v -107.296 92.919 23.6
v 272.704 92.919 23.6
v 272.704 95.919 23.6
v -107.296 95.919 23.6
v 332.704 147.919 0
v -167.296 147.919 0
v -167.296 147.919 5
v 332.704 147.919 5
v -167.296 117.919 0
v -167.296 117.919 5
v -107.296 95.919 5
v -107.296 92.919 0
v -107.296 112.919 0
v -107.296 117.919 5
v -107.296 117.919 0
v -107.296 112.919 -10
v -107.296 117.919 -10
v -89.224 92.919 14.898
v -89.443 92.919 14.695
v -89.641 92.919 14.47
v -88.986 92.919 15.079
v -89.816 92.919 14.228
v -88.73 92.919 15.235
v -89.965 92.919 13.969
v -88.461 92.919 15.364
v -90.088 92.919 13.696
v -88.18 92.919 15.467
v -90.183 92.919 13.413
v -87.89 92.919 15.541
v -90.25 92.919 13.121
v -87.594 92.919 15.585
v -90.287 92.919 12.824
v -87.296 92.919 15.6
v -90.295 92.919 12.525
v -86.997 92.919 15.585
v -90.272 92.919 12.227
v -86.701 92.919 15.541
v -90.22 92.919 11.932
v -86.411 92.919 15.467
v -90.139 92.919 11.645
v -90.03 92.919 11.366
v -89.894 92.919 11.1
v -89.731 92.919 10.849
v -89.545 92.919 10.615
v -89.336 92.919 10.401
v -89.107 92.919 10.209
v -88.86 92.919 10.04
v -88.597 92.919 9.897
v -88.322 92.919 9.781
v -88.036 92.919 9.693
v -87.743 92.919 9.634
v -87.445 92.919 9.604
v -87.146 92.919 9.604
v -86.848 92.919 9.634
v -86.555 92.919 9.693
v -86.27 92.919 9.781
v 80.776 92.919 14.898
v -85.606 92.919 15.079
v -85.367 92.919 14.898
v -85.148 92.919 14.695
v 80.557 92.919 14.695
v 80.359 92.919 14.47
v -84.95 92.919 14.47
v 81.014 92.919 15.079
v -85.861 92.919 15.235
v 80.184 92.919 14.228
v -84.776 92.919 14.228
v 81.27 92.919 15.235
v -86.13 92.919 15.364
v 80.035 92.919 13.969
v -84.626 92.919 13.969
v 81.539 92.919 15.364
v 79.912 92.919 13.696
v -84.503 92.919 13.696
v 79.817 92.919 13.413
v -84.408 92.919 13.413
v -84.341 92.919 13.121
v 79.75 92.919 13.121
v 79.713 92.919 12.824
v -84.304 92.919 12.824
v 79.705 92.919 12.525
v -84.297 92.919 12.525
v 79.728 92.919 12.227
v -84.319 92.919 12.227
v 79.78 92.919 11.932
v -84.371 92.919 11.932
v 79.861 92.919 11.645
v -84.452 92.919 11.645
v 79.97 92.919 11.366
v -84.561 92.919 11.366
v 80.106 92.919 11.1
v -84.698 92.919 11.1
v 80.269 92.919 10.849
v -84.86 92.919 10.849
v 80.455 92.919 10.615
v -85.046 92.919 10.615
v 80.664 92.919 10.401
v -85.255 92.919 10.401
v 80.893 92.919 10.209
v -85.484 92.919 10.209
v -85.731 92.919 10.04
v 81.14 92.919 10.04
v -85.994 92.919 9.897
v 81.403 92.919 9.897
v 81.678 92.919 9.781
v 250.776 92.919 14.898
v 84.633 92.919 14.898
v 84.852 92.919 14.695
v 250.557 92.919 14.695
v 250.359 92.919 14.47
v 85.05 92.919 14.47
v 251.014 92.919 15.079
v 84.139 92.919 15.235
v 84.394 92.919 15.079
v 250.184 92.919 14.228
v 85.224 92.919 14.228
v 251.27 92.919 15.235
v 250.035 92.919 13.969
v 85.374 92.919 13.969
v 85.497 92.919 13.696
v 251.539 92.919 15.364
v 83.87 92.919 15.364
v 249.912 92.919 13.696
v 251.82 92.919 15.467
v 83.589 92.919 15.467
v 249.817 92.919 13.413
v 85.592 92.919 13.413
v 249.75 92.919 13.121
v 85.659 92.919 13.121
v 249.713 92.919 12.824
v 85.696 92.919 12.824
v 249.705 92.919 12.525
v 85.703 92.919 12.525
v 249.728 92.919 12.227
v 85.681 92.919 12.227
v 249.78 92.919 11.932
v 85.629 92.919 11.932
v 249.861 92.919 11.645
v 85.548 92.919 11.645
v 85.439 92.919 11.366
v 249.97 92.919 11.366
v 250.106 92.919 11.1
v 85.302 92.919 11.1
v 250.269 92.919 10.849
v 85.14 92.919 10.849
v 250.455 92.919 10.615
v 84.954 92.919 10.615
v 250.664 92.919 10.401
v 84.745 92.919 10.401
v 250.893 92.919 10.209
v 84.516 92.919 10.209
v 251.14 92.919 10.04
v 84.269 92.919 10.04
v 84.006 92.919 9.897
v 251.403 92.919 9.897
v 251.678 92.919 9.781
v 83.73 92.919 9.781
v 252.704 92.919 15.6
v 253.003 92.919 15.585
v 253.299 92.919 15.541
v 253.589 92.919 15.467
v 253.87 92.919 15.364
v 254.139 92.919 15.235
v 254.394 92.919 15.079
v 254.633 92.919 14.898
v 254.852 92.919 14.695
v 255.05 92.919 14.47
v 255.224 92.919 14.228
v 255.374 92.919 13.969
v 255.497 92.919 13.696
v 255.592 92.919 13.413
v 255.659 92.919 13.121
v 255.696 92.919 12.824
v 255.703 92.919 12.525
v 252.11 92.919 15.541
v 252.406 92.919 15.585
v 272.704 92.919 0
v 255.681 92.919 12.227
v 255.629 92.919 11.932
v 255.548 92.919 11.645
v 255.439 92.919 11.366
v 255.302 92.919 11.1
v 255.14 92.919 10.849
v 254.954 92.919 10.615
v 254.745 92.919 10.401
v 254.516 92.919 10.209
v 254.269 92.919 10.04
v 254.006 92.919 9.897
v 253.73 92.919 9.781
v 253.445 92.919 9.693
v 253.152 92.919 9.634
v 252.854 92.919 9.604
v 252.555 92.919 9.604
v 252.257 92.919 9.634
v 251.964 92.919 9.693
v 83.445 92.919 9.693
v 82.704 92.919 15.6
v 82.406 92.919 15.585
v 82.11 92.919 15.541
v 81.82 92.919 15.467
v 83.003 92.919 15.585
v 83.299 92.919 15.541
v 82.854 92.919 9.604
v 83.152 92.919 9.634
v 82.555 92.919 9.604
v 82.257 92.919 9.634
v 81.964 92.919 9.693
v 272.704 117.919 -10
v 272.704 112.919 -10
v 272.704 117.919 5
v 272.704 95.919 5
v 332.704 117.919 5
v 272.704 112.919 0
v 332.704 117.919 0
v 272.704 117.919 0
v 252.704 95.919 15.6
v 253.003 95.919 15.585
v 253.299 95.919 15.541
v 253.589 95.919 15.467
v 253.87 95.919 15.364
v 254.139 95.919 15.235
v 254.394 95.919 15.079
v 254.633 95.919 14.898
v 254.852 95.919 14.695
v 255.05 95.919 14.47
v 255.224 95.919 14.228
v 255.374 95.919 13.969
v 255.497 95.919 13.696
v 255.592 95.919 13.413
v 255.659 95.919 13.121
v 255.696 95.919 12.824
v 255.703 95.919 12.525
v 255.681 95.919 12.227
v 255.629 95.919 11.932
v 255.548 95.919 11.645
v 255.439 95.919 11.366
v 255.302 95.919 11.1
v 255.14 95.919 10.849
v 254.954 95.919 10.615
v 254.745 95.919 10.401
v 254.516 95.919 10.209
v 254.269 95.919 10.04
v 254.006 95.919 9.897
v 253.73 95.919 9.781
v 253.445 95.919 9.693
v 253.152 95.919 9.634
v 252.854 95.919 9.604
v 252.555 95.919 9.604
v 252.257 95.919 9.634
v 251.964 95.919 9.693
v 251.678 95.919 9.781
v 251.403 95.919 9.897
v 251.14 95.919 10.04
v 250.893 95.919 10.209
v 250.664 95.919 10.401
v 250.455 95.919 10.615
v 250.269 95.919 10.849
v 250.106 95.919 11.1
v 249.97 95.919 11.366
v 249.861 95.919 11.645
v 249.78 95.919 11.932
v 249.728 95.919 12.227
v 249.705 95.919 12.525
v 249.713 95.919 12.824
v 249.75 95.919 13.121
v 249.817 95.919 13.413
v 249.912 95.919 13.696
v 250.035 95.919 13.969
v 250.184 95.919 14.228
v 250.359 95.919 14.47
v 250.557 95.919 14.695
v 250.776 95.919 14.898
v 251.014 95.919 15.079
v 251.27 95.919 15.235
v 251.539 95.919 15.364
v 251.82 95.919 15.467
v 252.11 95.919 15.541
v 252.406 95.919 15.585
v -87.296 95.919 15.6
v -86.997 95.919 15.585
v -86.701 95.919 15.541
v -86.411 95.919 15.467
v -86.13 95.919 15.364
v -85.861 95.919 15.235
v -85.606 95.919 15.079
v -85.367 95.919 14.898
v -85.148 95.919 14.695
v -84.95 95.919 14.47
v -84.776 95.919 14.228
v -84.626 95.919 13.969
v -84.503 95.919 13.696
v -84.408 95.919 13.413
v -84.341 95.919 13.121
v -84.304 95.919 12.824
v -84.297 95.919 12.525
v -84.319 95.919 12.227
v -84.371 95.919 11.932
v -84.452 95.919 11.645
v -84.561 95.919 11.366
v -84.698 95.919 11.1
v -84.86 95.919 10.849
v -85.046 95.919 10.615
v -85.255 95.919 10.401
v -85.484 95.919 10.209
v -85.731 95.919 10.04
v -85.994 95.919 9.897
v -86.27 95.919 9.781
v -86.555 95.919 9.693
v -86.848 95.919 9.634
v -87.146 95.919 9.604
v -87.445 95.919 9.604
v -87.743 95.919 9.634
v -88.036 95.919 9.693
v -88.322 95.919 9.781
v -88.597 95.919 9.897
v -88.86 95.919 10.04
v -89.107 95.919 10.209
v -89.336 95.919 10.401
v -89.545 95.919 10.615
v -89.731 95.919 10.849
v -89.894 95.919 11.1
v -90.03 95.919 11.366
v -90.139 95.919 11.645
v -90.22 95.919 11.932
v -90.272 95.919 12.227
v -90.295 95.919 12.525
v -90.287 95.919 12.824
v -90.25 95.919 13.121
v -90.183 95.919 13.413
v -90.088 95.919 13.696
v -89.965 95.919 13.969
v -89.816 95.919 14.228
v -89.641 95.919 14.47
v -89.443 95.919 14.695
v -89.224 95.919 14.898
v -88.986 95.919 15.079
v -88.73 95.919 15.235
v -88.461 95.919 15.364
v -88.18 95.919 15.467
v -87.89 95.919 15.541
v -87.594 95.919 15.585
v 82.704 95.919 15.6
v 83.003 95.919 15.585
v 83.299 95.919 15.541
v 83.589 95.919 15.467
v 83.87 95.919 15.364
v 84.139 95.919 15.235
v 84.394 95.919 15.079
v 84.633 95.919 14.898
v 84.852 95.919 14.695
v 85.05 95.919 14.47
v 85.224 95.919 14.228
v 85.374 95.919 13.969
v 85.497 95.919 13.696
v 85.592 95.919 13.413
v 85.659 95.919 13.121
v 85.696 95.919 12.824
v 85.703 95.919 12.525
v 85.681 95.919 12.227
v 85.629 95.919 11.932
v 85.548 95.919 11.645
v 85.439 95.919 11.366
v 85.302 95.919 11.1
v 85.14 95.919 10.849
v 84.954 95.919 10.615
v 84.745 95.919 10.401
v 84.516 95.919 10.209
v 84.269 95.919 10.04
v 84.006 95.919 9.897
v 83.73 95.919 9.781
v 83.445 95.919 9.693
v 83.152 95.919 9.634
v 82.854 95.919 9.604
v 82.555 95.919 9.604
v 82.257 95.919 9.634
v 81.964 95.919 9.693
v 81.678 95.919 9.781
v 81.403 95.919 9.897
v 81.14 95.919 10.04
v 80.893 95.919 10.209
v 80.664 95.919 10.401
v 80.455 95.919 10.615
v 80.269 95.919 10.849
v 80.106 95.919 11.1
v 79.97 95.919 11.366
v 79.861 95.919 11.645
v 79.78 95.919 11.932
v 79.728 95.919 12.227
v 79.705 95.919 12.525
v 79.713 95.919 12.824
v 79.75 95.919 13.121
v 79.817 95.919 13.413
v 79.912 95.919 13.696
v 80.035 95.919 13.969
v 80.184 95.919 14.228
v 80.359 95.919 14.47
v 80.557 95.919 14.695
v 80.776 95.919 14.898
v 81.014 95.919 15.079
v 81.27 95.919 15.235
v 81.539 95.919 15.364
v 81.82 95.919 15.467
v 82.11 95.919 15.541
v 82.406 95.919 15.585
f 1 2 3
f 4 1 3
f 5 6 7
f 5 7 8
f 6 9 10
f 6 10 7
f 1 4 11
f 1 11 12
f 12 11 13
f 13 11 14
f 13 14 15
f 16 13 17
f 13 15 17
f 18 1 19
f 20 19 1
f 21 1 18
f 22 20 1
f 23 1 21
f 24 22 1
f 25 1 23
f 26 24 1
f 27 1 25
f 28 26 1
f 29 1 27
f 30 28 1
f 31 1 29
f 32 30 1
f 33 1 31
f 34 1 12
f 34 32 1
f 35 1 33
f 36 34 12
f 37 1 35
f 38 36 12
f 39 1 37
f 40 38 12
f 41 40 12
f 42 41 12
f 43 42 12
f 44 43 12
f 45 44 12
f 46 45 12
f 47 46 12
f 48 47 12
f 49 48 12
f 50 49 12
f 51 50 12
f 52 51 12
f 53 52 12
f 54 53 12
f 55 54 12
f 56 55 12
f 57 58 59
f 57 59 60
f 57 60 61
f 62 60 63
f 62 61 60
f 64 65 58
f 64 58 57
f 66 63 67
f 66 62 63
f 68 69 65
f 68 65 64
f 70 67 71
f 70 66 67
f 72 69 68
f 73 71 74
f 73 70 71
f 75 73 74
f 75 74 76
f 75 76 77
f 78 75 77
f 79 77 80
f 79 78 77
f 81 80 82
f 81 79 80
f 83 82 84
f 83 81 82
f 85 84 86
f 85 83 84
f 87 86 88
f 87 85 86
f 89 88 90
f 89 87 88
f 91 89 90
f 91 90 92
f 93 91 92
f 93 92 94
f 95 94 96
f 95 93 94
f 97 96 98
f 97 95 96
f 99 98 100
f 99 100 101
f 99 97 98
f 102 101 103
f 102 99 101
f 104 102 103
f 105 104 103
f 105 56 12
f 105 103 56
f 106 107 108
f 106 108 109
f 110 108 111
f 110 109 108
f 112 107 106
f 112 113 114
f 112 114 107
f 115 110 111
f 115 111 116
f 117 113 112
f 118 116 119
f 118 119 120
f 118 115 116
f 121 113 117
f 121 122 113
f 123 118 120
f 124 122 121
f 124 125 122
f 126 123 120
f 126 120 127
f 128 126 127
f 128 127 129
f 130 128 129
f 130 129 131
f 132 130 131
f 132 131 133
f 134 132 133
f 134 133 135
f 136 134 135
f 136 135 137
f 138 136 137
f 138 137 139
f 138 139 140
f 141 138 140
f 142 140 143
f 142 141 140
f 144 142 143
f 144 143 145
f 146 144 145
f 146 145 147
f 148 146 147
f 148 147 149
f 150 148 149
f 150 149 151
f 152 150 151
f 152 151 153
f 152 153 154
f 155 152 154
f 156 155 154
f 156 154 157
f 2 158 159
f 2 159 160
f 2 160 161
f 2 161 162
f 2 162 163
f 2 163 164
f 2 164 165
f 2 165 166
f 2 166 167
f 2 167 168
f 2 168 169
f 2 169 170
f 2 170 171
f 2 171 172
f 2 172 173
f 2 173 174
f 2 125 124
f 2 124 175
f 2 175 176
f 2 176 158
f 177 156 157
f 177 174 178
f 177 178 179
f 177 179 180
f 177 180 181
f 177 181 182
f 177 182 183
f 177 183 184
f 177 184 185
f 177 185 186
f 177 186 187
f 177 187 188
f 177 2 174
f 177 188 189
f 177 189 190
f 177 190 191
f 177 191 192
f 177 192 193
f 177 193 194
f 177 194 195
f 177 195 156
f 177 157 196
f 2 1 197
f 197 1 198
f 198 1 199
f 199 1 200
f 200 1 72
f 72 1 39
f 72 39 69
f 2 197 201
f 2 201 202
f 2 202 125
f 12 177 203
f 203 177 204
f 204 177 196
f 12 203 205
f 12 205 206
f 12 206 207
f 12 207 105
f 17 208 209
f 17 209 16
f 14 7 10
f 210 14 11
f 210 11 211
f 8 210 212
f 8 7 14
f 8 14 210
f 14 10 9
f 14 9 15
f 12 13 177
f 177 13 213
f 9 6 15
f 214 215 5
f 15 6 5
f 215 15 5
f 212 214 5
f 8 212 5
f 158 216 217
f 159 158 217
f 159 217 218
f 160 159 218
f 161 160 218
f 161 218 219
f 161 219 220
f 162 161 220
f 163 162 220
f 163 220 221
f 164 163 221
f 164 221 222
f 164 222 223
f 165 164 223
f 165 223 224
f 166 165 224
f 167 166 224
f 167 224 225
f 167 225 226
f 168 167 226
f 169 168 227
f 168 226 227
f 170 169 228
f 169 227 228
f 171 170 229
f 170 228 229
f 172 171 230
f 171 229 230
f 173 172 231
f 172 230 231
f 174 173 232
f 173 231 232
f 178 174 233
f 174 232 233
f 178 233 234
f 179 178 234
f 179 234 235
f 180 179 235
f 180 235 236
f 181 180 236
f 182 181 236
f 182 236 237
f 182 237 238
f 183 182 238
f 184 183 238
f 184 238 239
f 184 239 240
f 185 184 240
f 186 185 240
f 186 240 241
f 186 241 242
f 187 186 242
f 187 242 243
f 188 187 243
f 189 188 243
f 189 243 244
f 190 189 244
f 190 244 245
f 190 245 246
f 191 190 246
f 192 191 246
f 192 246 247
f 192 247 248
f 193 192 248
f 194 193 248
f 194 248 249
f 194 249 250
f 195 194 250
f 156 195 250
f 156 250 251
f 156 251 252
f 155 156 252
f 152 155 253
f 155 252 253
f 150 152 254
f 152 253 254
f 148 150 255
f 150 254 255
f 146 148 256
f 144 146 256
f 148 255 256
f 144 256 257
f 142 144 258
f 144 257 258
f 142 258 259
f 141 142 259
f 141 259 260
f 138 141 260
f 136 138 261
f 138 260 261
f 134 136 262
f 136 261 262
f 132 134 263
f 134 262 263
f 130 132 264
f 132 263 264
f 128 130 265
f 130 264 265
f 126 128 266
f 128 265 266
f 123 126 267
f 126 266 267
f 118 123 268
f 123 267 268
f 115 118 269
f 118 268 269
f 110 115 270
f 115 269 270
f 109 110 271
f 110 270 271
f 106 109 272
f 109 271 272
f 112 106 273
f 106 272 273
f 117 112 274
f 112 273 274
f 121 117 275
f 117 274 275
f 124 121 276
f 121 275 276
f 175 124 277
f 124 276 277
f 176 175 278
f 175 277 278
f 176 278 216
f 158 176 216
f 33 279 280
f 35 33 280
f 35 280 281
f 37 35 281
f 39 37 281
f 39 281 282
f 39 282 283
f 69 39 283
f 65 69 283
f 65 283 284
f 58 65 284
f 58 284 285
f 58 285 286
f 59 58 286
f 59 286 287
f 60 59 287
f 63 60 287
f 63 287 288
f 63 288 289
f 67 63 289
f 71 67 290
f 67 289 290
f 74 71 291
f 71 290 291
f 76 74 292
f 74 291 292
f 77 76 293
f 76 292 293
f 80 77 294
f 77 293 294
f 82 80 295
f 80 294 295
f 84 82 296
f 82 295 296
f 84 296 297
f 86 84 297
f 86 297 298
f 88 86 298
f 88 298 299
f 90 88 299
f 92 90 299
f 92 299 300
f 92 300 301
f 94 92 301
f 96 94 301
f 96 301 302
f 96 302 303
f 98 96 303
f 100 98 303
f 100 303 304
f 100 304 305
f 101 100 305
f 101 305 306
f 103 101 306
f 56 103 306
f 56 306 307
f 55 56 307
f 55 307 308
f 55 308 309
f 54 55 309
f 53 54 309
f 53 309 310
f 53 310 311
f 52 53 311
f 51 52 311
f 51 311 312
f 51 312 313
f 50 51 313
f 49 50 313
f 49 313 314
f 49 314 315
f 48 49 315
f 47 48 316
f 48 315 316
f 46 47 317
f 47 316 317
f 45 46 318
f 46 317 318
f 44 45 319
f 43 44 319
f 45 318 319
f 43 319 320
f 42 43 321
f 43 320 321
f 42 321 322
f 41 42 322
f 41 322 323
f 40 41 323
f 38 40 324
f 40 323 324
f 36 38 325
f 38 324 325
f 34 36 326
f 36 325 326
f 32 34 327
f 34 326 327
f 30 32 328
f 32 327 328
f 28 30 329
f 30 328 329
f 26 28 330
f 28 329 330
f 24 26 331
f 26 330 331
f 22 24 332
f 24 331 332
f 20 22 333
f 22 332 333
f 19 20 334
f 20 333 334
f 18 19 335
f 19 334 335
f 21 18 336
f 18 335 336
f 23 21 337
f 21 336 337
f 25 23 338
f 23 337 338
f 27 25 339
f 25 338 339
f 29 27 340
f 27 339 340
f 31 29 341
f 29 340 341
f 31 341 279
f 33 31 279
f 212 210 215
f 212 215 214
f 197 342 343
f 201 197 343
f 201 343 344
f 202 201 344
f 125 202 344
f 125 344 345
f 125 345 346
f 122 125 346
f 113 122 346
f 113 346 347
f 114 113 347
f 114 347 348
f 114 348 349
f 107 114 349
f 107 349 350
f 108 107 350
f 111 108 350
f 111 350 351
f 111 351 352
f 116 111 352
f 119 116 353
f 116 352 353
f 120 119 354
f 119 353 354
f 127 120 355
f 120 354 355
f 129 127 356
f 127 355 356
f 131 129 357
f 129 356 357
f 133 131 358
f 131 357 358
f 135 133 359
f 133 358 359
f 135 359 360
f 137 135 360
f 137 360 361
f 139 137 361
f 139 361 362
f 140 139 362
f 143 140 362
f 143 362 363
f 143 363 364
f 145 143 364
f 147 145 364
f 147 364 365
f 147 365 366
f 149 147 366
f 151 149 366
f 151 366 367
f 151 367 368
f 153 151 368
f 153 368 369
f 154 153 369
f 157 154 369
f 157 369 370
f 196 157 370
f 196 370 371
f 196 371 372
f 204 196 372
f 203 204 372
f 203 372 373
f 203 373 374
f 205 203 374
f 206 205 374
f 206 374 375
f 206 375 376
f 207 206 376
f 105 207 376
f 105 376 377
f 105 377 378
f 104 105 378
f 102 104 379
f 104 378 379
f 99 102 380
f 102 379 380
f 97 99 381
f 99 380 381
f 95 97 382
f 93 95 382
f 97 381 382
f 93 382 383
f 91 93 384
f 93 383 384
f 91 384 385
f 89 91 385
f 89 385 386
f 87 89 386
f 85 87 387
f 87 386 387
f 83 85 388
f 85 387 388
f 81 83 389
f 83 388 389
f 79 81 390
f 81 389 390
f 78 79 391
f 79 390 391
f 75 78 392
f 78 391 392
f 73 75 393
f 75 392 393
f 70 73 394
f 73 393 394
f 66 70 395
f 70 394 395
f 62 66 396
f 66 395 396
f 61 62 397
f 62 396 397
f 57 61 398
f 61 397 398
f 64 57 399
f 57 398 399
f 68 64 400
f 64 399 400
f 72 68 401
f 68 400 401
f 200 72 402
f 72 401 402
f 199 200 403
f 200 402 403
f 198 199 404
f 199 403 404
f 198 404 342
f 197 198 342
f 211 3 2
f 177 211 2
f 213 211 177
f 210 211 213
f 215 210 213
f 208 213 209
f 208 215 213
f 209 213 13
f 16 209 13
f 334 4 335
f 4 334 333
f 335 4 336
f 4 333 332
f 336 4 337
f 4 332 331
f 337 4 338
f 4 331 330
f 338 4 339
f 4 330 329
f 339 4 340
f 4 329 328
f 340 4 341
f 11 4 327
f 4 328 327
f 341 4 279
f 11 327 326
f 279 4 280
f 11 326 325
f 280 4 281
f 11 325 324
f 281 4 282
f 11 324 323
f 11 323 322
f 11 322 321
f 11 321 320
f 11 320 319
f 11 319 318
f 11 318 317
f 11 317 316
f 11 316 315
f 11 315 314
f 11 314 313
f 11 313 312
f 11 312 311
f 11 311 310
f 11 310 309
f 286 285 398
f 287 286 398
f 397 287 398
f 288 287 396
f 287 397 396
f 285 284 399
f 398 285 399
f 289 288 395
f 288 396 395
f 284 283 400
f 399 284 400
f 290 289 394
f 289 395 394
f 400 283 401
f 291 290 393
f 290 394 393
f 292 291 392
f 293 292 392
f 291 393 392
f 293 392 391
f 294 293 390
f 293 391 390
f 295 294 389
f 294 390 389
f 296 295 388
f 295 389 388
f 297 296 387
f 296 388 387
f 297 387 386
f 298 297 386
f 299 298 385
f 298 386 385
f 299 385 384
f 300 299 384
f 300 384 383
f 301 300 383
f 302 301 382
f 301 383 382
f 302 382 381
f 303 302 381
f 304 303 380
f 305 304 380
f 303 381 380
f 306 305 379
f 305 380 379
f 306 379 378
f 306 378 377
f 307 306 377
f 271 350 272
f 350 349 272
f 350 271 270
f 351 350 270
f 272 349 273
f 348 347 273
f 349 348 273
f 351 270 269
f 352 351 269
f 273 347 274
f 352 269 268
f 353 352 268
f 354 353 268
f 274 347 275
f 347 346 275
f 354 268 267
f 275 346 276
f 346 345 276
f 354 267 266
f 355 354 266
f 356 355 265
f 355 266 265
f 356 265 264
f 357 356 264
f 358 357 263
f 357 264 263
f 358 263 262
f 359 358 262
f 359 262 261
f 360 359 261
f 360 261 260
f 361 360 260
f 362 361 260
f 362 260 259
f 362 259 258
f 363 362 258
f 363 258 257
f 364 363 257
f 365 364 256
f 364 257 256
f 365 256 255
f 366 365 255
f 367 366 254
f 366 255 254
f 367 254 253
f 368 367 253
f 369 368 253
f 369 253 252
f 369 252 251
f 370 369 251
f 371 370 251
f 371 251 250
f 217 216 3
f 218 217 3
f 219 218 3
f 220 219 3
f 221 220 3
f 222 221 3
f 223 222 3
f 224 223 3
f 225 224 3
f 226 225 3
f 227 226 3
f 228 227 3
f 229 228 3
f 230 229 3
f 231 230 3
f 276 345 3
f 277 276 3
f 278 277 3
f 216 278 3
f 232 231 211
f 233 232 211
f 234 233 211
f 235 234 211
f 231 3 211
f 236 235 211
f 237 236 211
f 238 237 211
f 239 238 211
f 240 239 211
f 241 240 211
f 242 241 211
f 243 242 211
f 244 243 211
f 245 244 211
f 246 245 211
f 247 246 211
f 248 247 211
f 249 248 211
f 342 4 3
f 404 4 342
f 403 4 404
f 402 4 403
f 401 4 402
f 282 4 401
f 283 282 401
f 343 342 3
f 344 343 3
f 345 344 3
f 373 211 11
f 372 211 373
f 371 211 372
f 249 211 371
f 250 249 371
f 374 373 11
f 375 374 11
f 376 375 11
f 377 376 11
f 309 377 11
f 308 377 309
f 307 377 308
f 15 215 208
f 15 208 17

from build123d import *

# Parameters (mm, degrees)
SKETCH_1_W          = 500
SKETCH_1_H          = 55
EXTRUDE_1_DEPTH     = 5
SKETCH_2_W          = 500
SKETCH_2_H          = 5
EXTRUDE_2_DEPTH     = 10
SKETCH_6_W          = 60
SKETCH_6_H          = 25
CUT_EXTRUDE_2_DEPTH = 365.413710539
SKETCH_7_W          = 18.6
SKETCH_7_H          = 3
EXTRUDE_5_DEPTH     = 380
SKETCH_8_R          = 3
CUT_EXTRUDE_3_DEPTH = 338.569517956


with BuildPart() as part:
    # 草图1 → 凸台-拉伸1 (new body)
    with BuildSketch(Plane.XY):
        with Locations((82.704402516, 120.419346185)):
            Rectangle(SKETCH_1_W, SKETCH_1_H)
    extrude(amount=EXTRUDE_1_DEPTH)

    # 草图2 → 凸台-拉伸2 (add)
    with BuildSketch(Plane(origin=(0, 0, 0), x_dir=(-1, 0, 0), z_dir=(0, 0, -1))):
        with Locations((-82.704402516, 115.419346185)):
            Rectangle(SKETCH_2_W, SKETCH_2_H)
    extrude(amount=EXTRUDE_2_DEPTH)

    # 草图6 → 切除-拉伸2 (cut, through all)
    with BuildSketch(Plane.XY.offset(5)):
        with Locations((302.704402516, 105.419346185)):
            Rectangle(SKETCH_6_W, SKETCH_6_H)
        with Locations((-137.295597484, 105.419346185)):
            Rectangle(SKETCH_6_W, SKETCH_6_H)
    extrude(amount=-CUT_EXTRUDE_2_DEPTH, mode=Mode.SUBTRACT)

    # 草图7 → 凸台-拉伸5 (add)
    with BuildSketch(Plane(origin=(272.704402516, 0, 0), x_dir=(0, 0, -1), z_dir=(1, 0, 0))):
        with Locations((-14.3, 94.419346185)):
            Rectangle(SKETCH_7_W, SKETCH_7_H)
    extrude(amount=-EXTRUDE_5_DEPTH)

    # 草图8 → 切除-拉伸3 (cut, through all)
    with BuildSketch(Plane(origin=(0, 95.919346185, 0), x_dir=(1, 0, 0), z_dir=(0, 1, 0))):
        with Locations(Location((-87.295597484, -12.6, 0), (0, 0, 270))):
            Circle(SKETCH_8_R)
        with Locations(Location((82.704402516, -12.6, 0), (0, 0, 270))):
            Circle(SKETCH_8_R)
        with Locations(Location((252.704402516, -12.6, 0), (0, 0, 270))):
            Circle(SKETCH_8_R)
    extrude(amount=-CUT_EXTRUDE_3_DEPTH, mode=Mode.SUBTRACT)


solid = part.part
